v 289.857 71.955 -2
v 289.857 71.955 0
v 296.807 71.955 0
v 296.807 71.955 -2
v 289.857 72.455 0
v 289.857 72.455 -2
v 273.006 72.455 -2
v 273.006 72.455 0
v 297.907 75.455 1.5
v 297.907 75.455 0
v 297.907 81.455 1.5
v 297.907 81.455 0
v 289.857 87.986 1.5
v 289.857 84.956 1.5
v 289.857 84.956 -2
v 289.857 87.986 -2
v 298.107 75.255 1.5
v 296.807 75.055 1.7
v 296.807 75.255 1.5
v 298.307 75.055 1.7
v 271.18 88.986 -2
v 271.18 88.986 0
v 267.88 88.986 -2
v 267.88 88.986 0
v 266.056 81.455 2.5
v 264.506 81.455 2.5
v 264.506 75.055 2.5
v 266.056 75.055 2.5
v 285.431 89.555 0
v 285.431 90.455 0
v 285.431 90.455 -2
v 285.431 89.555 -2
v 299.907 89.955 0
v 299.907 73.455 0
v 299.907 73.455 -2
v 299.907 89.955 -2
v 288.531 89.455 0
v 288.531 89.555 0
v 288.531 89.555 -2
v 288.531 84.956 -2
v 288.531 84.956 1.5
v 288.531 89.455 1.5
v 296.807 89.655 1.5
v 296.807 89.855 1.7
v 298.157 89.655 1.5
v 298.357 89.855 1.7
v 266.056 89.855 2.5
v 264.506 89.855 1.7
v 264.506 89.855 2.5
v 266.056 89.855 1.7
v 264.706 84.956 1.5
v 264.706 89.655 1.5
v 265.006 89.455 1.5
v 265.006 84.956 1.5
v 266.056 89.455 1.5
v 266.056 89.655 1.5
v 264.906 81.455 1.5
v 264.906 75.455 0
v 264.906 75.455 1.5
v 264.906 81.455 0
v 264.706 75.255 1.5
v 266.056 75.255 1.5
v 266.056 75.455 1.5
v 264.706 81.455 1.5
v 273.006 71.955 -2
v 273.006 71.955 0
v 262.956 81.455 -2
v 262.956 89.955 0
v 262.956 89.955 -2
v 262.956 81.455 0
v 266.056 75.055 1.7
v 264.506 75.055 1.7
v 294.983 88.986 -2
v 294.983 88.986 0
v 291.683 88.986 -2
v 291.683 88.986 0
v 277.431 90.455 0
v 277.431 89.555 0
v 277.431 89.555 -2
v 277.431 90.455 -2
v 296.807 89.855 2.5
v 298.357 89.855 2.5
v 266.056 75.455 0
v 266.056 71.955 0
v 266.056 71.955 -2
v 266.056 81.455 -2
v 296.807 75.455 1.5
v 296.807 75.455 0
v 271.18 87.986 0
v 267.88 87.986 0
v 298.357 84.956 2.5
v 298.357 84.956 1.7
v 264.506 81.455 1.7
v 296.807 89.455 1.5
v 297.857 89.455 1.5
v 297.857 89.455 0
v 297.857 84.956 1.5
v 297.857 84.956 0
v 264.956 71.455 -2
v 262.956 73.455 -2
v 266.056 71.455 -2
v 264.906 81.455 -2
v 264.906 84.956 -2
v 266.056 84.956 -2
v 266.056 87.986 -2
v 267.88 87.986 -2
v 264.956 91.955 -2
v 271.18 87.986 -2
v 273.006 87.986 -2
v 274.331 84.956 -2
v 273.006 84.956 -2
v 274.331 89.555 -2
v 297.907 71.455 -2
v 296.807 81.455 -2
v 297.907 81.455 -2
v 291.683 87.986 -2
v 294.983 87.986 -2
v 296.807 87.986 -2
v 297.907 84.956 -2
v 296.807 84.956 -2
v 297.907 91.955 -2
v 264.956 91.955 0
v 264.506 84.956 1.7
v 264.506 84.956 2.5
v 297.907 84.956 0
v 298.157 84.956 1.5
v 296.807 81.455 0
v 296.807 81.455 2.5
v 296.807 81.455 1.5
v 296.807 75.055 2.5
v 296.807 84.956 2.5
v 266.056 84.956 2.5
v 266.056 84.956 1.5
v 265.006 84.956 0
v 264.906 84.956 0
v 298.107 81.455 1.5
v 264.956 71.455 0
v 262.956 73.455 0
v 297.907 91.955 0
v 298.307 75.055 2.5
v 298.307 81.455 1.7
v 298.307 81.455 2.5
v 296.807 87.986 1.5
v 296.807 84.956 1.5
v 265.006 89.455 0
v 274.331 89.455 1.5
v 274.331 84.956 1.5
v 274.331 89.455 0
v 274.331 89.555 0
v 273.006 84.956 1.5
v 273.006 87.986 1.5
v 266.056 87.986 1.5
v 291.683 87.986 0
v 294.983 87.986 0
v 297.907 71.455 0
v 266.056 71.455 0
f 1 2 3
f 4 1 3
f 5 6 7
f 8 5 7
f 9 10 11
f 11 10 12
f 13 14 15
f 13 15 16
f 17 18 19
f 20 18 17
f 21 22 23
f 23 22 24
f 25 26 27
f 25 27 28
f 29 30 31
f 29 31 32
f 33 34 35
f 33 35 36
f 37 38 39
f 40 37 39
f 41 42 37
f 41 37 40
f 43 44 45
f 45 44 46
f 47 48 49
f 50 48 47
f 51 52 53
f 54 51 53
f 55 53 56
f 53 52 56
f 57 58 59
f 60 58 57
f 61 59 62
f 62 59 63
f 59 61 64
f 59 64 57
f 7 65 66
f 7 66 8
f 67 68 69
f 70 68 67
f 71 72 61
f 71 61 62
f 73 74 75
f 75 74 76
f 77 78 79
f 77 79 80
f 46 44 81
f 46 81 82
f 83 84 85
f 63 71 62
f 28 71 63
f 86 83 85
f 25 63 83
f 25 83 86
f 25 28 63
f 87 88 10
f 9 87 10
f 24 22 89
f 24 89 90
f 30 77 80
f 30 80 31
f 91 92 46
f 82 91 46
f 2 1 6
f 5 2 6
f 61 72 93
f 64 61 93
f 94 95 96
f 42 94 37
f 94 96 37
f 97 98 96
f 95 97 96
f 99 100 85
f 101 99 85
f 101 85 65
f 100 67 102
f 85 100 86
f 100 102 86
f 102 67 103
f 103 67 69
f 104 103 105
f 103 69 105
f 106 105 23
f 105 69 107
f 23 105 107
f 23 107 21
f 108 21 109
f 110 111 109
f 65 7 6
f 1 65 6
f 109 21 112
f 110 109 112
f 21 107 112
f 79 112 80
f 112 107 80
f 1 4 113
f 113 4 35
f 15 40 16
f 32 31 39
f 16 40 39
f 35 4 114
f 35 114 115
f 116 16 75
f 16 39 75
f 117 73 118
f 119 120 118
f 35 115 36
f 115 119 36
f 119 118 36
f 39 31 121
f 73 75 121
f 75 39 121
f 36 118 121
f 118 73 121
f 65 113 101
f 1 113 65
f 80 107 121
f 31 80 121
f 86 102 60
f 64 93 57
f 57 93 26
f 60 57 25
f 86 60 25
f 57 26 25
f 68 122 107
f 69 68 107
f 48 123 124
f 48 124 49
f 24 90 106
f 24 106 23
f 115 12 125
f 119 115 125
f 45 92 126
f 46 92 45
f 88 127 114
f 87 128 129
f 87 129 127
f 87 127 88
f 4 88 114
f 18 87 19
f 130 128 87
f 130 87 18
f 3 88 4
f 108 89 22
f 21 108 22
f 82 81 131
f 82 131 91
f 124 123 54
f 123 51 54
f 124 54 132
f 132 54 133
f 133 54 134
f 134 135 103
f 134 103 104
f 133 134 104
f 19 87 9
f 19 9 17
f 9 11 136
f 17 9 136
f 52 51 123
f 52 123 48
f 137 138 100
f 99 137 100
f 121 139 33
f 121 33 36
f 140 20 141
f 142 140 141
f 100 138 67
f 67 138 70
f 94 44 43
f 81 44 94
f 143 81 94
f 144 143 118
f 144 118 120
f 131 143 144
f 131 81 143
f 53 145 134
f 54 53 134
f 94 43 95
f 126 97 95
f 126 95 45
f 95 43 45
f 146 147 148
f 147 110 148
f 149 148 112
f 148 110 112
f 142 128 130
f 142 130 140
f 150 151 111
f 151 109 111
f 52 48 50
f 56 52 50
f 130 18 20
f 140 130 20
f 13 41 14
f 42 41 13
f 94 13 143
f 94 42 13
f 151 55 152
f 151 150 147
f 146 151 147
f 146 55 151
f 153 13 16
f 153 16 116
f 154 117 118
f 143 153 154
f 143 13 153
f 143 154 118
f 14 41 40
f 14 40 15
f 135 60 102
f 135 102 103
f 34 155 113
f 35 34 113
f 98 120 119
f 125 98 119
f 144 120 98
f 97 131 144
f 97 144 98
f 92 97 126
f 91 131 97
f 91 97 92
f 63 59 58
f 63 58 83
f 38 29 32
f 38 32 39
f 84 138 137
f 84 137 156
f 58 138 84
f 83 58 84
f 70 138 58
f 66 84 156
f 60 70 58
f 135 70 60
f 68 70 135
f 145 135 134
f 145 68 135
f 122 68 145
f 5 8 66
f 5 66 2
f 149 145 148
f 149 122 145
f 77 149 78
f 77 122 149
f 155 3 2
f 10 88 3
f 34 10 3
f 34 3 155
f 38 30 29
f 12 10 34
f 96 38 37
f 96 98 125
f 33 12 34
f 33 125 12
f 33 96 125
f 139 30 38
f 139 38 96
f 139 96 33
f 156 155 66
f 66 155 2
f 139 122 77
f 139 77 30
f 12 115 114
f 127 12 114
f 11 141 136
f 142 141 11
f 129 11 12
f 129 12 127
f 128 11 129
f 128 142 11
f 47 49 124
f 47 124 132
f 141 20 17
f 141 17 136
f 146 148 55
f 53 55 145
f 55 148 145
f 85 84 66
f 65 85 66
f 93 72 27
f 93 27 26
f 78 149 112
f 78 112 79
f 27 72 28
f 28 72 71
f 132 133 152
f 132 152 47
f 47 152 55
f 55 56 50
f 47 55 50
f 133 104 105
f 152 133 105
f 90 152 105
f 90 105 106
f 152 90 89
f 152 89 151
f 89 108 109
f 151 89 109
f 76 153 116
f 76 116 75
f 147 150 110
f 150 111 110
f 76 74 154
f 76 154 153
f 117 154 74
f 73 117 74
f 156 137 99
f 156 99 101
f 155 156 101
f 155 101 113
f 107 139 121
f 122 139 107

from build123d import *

# Parameters (mm, degrees)
SKETCH2_W           = 30.751006124
SKETCH2_H           = 0.5
SKETCH2_W_2         = 3.100075991
SKETCH2_H_2         = 10.000695173
SKETCH2_W_3         = 2
SKETCH2_H_3         = 3.50017022
SKETCH2_W_4         = 1.95
BOSS_EXTRUDE1_DEPTH = 2
SKETCH3_W           = 1.150075991
SKETCH3_H           = 6.000695173
SKETCH3_W_2         = 1.100075991
BOSS_EXTRUDE2_DEPTH = 1.5
SKETCH4_W           = 1.550075991
SKETCH4_H           = 4.899134607
SKETCH4_H_2         = 6.400695173
SKETCH4_W_2         = 1.500075991
BOSS_EXTRUDE3_DEPTH = 1
CHAMFER1_SIZE       = 0.2
CUT_EXTRUDE1_START  = -2
SKETCH5_W           = 3.300200616
SKETCH5_H           = 1
SKETCH5_W_2         = 3.300200617
CUT_EXTRUDE1_DEPTH  = 2
SKETCH8_W           = 16.850185419
SKETCH8_H           = 0.5
BOSS_EXTRUDE4_DEPTH = 2
CHAMFER2_SIZE       = 2


with BuildPart() as part:
    # Sketch2 → Boss-Extrude1 (new body)
    with BuildSketch(Plane.XY):
        Polygon((277.431409328, 90.45473243), (281.431409328, 90.45473243), (281.431409328, 91.95473243), (262.955830275, 91.95473243), (262.955830275, 84.955597823), (264.905830275, 84.955597823), (266.055906266, 84.955597823), (266.055906266, 87.985794184), (273.006316619, 87.985794184), (273.006316619, 84.955597823), (274.331409328, 84.955597823), (274.331409328, 89.55473243), (277.431409328, 89.55473243), align=None)
        Polygon((281.431409328, 91.95473243), (281.431409328, 90.45473243), (285.431409328, 90.45473243), (285.431409328, 89.55473243), (288.531409328, 89.55473243), (288.531409328, 84.955597823), (289.856502038, 84.955597823), (289.856502038, 87.985794184), (296.80691239, 87.985794184), (296.80691239, 84.955597823), (297.906988381, 84.955597823), (299.906988381, 84.955597823), (299.906988381, 91.95473243), align=None)
        with Locations((281.431409328, 71.70473243)):
            Rectangle(SKETCH2_W, SKETCH2_H)
        with Locations((264.505868271, 76.455080017)):
            Rectangle(SKETCH2_W_2, SKETCH2_H_2)
        Polygon((299.906988381, 71.45473243), (299.906988381, 81.455427603), (297.906988381, 81.455427603), (296.80691239, 81.455427603), (296.80691239, 71.95473243), (296.80691239, 71.45473243), align=None)
        with Locations((298.906988381, 83.205512713)):
            Rectangle(SKETCH2_W_3, SKETCH2_H_3)
        with Locations((263.930830275, 83.205512713)):
            Rectangle(SKETCH2_W_4, SKETCH2_H_3)
    extrude(amount=-BOSS_EXTRUDE1_DEPTH)

    # Sketch3 → Boss-Extrude2 (add)
    with BuildSketch(Plane.XY):
        Polygon((265.005830275, 84.955597823), (266.055906266, 84.955597823), (266.055906266, 87.985794184), (273.006316619, 87.985794184), (273.006316619, 84.955597823), (274.331409328, 84.955597823), (274.331409328, 89.45473243), (265.005830275, 89.45473243), align=None)
        with Locations((265.480868271, 78.455080017)):
            Rectangle(SKETCH3_W, SKETCH3_H)
        with Locations((297.356950385, 78.455080017)):
            Rectangle(SKETCH3_W_2, SKETCH3_H)
        Polygon((288.531409328, 89.45473243), (288.531409328, 84.955597823), (289.856502038, 84.955597823), (289.856502038, 87.985794184), (296.80691239, 87.985794184), (296.80691239, 84.955597823), (297.856988381, 84.955597823), (297.856988381, 89.45473243), align=None)
    extrude(amount=BOSS_EXTRUDE2_DEPTH)

    # Sketch4 → Boss-Extrude3 (add)
    with BuildSketch(Plane.XY.offset(1.5)):
        with Locations((265.280868271, 87.405165127)):
            Rectangle(SKETCH4_W, SKETCH4_H)
        with Locations((265.280868271, 78.255080017)):
            Rectangle(SKETCH4_W, SKETCH4_H_2)
        with Locations((297.556950386, 78.255080017)):
            Rectangle(SKETCH4_W_2, SKETCH4_H_2)
        with Locations((297.581950386, 87.405165127)):
            Rectangle(SKETCH4_W, SKETCH4_H)
    extrude(amount=BOSS_EXTRUDE3_DEPTH)

    # Chamfer1
    chamfer1_edges = [part.edges().sort_by_distance(p)[0] for p in [
        (298.356988381, 87.405165127, 1.5),
        (297.581950386, 89.85473243, 1.5),
        (297.556950386, 75.05473243, 1.5),
        (298.306988381, 78.255080016, 1.5),
        (265.280868271, 75.05473243, 1.5),
        (264.505830275, 78.255080016, 1.5),
        (265.280868271, 89.85473243, 1.5),
        (264.505830275, 87.405165127, 1.5),
    ]]
    chamfer(chamfer1_edges, length=CHAMFER1_SIZE)

    # Sketch5 → Cut-Extrude1 (cut)
    with BuildSketch(Plane(origin=(0, 0, -2), x_dir=(-1, 0, 0), z_dir=(0, 0, -1)).offset(CUT_EXTRUDE1_START)):
        with Locations((-269.530111382, 88.485794184)):
            Rectangle(SKETCH5_W, SKETCH5_H)
        with Locations((-293.332707275, 88.485794184)):
            Rectangle(SKETCH5_W_2, SKETCH5_H)
    extrude(amount=CUT_EXTRUDE1_DEPTH, mode=Mode.SUBTRACT)

    # Sketch8 → Boss-Extrude4 (add)
    with BuildSketch(Plane(origin=(0, 0, -2), x_dir=(-1, 0, 0), z_dir=(0, 0, -1))):
        with Locations((-281.431409329, 72.20473243)):
            Rectangle(SKETCH8_W, SKETCH8_H)
    extrude(amount=-BOSS_EXTRUDE4_DEPTH)

    # Chamfer2
    chamfer2_edges = [part.edges().sort_by_distance(p)[0] for p in [
        (262.955830275, 91.95473243, -1),
        (299.906988381, 91.95473243, -1),
        (262.955830275, 71.45473243, -1),
        (299.906988381, 71.45473243, -1),
    ]]
    chamfer(chamfer2_edges, length=CHAMFER2_SIZE)


solid = part.part
